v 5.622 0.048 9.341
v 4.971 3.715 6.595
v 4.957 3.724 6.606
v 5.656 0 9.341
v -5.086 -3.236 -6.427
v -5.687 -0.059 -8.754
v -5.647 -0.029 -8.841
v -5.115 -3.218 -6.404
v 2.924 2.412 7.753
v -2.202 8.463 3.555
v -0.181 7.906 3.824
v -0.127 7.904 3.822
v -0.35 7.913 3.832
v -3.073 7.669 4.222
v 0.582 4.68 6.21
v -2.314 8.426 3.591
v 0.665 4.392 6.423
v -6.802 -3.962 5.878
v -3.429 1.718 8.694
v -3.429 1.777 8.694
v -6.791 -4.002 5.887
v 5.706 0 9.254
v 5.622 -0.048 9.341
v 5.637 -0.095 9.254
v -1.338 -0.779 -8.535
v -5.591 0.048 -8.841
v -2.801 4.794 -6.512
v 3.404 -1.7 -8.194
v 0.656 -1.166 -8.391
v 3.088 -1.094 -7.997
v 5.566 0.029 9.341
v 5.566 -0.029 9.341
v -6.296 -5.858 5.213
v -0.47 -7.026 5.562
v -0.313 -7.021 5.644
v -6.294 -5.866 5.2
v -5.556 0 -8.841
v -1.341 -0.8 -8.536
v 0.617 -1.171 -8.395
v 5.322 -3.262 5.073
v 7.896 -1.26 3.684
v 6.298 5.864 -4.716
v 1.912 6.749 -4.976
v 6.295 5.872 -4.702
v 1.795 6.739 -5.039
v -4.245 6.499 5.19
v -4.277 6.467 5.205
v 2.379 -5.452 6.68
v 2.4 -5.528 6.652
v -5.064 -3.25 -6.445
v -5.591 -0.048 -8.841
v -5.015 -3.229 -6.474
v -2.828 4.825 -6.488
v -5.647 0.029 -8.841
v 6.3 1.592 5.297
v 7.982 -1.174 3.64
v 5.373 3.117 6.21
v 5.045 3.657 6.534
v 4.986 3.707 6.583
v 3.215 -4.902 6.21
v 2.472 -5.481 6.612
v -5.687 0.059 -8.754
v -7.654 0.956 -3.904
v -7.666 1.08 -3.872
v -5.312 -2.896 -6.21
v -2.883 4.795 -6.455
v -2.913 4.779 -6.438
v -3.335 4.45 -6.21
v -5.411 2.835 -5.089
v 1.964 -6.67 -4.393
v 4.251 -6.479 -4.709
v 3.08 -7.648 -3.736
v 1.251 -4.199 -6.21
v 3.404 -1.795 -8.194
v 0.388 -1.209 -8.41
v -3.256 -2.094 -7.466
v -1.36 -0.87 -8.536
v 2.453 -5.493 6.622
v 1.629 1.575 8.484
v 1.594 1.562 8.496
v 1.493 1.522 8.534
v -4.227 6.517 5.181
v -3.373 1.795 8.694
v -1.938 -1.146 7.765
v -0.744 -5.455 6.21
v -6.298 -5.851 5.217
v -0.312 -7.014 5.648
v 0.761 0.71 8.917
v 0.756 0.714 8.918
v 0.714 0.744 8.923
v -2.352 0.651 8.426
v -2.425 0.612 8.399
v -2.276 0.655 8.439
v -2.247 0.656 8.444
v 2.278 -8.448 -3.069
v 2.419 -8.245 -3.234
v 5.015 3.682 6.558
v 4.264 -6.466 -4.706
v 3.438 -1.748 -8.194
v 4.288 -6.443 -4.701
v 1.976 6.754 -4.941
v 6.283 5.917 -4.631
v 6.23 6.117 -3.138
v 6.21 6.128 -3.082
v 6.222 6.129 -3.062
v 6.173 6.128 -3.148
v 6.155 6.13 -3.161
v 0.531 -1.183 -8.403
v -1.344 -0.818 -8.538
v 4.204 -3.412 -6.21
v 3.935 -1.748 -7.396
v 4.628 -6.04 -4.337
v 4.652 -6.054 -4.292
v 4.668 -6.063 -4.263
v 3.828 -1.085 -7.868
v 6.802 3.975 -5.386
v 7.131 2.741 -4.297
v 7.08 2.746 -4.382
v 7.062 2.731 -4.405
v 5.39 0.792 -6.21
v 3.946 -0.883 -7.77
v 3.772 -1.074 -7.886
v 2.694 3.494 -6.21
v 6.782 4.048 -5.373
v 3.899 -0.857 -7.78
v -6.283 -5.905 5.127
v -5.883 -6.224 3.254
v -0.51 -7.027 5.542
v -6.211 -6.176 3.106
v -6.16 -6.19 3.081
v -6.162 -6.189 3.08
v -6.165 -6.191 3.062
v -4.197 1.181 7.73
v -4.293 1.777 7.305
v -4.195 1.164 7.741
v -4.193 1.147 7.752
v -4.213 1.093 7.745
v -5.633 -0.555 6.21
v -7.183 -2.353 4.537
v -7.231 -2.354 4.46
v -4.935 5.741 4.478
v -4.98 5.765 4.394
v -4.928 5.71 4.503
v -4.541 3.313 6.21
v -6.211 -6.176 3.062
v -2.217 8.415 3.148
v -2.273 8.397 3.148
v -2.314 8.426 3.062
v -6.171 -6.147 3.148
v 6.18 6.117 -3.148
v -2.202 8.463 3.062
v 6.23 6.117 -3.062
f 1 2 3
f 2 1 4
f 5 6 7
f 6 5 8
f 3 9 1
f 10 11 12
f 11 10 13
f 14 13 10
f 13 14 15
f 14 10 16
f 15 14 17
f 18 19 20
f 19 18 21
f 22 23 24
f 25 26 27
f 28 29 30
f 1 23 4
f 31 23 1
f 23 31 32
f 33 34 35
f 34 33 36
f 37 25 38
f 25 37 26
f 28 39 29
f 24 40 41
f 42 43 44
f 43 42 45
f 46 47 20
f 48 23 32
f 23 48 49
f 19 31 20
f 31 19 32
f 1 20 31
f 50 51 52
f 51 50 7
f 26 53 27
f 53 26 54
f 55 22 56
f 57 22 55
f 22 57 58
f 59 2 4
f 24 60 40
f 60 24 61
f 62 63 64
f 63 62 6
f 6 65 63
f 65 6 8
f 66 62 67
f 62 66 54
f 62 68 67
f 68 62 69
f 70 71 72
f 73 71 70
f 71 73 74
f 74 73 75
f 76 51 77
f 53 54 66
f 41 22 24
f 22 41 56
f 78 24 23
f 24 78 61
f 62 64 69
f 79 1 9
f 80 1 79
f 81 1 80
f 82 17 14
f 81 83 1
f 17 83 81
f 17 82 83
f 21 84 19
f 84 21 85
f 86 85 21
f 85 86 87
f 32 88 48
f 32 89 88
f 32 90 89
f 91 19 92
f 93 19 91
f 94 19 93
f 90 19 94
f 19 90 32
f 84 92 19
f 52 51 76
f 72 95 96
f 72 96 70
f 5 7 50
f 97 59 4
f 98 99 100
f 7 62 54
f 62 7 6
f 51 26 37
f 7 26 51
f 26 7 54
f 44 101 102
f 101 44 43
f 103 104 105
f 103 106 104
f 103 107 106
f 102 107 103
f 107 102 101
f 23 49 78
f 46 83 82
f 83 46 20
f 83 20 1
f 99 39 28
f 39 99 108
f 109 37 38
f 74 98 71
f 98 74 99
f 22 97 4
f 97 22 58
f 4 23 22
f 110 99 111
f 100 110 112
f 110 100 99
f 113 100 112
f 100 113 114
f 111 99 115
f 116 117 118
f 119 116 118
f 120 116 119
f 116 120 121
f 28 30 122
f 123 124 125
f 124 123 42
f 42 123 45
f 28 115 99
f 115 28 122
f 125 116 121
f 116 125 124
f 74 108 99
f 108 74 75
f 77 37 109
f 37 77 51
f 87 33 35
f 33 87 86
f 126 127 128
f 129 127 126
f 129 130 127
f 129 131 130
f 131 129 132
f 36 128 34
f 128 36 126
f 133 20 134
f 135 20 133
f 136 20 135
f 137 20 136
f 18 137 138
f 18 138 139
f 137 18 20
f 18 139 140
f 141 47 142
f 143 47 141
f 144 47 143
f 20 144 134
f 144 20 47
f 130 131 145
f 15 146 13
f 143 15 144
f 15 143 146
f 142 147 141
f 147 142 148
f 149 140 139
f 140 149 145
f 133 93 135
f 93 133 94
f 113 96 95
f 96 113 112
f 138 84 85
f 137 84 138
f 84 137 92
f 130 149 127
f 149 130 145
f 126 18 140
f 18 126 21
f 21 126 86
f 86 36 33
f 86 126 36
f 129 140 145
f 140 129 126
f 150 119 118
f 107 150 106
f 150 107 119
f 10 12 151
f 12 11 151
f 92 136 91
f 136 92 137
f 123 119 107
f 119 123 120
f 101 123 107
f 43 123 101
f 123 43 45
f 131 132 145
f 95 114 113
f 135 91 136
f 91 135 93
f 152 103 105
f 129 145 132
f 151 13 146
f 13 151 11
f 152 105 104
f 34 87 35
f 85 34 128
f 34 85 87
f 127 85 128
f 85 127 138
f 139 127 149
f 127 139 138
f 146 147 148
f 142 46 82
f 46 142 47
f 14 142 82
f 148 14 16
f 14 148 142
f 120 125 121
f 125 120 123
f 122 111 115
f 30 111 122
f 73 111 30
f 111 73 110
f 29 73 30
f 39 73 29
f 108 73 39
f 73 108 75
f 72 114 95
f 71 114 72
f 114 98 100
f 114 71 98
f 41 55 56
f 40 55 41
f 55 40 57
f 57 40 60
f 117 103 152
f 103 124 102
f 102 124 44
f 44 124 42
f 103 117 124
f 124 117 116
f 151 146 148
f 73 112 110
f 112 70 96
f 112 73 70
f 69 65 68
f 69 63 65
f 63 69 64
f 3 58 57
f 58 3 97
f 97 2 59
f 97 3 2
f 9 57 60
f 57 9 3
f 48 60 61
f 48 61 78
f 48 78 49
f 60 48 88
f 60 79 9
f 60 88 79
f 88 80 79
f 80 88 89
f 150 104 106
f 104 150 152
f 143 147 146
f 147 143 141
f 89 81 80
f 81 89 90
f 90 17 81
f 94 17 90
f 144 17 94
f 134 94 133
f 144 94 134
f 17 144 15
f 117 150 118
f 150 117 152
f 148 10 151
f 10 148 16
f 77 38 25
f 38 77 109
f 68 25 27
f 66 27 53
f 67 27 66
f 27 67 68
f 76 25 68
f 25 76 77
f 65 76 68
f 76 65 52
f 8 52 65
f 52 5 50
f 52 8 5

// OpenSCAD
// Auto-generated OpenSCAD file

    shift = 0.25;

    inner_points = 10*[[0.22327401859321738, -0.8367488946038767, 0.6123724356961423], [-0.22327401859321738, 0.8367488946038767, -0.6123724356961423], [0.836282808612776, -0.22501347519511394, -0.6123724356952596], [-0.836282808612776, 0.22501347519511394, 0.6123724356952596], [0.613008790018514, 0.6117354194092477, 0.6123724356959815], [-0.613008790018514, -0.6117354194092477, -0.6123724356959815], [0.8362828086122537, -0.2250134751948715, 0.30618621784843225], [0.6130087900190364, 0.6117354194090052, -0.30618621784771016], [0.2232740185937397, -0.8367488946041193, -0.3061862178475494], [5.22267782335276e-13, -2.42445028968155e-13, -0.9185586535436918], [-5.22267782335276e-13, 2.42445028968155e-13, 0.9185586535436918], [-0.2232740185937397, 0.8367488946041193, 0.3061862178475494], [-0.6130087900190364, -0.6117354194090052, 0.30618621784771016], [-0.8362828086122537, 0.2250134751948715, -0.30618621784843225]];

    outer_points_unshifted = 10*[[-0.4707968572409631, 0.904114699830419, 0.293132954071328], [0.4707968572409631, -0.904114699830419, -0.293132954071328], [0.5606144055656594, 0.0, 0.900395184500818], [-0.5606144055656594, 0.0, -0.900395184500818], [0.7675036205024015, 0.5545958975240901, -0.4778719315519111], [-0.7675036205024015, -0.5545958975240901, 0.4778719315519111], [0.42866058441354893, 0.7293552986772546, 0.3578281035101174], [0.899457441654512, -0.17475940115316446, 0.06469514943878946], [-0.3388430360888526, 0.17475940115316446, 0.8357000350620285], [0.13195382115211052, -0.7293552986772546, 0.5425670809907006], [-0.13195382115211052, 0.7293552986772546, -0.5425670809907006], [0.3388430360888526, -0.17475940115316446, -0.8357000350620285], [-0.899457441654512, 0.17475940115316446, -0.06469514943878946], [-0.42866058441354893, -0.7293552986772546, -0.3578281035101174]];

    outer_points = [for (p = outer_points_unshifted) [p[0], p[1], p[2] + shift]];

    // Convex hull for inner set (I)
    module inner_hull() {
        hull() {
            for (p = inner_points) {
                translate(p) sphere(r=0.1);
            }
        }
    }

    // Convex hull for outer set (O) minus inner hull (O \ I)
    module outer_minus_inner() {
        difference() {
            hull() {
                for (p = outer_points) {
                    translate(p) sphere(r=0.1);
                }
            }
            inner_hull(); // Subtract inner hull
        }
    }

    // Convex hull for outer set (O) minus all translated inner hulls
    module outer_minus_AllTranslationInner() {
        difference() {
            hull() {
                for (p = outer_points) {
                    translate(p) sphere(r=0.1);
                }
            }
            hull() {
                translate([0,0,50]) inner_hull();
                translate([0,0,-50]) inner_hull();
            }; // Subtract translated inner hulls
        }
    }

    // Difference between outer_minus_inner and outer_minus_AllTranslationInner
    module outer_minus_inner_diff() {
        difference() {
            // Outer minus inner
            difference() {
                hull() {
                    for (p = outer_points) {
                        translate(p) sphere(r=0.1);
                    }
                }
                inner_hull();
            }

            // Subtract Outer minus AllTranslationInner
            difference() {
                hull() {
                    for (p = outer_points) {
                        translate(p) sphere(r=0.1);
                    }
                }
                hull() {
                    translate([0,0,50]) inner_hull();
                    translate([0,0,-50]) inner_hull();
                };
            }
        }
    }

    // Rendering all with colors applied
    // color([1, 0, 0, 0.5]) inner_hull(); // Transparent red
    // color([0, 0, 1, 1]) outer_minus_inner(); // Opaque blue
    color([1, 1, 0, 1]) outer_minus_inner_diff(); // Opaque yellow
    
